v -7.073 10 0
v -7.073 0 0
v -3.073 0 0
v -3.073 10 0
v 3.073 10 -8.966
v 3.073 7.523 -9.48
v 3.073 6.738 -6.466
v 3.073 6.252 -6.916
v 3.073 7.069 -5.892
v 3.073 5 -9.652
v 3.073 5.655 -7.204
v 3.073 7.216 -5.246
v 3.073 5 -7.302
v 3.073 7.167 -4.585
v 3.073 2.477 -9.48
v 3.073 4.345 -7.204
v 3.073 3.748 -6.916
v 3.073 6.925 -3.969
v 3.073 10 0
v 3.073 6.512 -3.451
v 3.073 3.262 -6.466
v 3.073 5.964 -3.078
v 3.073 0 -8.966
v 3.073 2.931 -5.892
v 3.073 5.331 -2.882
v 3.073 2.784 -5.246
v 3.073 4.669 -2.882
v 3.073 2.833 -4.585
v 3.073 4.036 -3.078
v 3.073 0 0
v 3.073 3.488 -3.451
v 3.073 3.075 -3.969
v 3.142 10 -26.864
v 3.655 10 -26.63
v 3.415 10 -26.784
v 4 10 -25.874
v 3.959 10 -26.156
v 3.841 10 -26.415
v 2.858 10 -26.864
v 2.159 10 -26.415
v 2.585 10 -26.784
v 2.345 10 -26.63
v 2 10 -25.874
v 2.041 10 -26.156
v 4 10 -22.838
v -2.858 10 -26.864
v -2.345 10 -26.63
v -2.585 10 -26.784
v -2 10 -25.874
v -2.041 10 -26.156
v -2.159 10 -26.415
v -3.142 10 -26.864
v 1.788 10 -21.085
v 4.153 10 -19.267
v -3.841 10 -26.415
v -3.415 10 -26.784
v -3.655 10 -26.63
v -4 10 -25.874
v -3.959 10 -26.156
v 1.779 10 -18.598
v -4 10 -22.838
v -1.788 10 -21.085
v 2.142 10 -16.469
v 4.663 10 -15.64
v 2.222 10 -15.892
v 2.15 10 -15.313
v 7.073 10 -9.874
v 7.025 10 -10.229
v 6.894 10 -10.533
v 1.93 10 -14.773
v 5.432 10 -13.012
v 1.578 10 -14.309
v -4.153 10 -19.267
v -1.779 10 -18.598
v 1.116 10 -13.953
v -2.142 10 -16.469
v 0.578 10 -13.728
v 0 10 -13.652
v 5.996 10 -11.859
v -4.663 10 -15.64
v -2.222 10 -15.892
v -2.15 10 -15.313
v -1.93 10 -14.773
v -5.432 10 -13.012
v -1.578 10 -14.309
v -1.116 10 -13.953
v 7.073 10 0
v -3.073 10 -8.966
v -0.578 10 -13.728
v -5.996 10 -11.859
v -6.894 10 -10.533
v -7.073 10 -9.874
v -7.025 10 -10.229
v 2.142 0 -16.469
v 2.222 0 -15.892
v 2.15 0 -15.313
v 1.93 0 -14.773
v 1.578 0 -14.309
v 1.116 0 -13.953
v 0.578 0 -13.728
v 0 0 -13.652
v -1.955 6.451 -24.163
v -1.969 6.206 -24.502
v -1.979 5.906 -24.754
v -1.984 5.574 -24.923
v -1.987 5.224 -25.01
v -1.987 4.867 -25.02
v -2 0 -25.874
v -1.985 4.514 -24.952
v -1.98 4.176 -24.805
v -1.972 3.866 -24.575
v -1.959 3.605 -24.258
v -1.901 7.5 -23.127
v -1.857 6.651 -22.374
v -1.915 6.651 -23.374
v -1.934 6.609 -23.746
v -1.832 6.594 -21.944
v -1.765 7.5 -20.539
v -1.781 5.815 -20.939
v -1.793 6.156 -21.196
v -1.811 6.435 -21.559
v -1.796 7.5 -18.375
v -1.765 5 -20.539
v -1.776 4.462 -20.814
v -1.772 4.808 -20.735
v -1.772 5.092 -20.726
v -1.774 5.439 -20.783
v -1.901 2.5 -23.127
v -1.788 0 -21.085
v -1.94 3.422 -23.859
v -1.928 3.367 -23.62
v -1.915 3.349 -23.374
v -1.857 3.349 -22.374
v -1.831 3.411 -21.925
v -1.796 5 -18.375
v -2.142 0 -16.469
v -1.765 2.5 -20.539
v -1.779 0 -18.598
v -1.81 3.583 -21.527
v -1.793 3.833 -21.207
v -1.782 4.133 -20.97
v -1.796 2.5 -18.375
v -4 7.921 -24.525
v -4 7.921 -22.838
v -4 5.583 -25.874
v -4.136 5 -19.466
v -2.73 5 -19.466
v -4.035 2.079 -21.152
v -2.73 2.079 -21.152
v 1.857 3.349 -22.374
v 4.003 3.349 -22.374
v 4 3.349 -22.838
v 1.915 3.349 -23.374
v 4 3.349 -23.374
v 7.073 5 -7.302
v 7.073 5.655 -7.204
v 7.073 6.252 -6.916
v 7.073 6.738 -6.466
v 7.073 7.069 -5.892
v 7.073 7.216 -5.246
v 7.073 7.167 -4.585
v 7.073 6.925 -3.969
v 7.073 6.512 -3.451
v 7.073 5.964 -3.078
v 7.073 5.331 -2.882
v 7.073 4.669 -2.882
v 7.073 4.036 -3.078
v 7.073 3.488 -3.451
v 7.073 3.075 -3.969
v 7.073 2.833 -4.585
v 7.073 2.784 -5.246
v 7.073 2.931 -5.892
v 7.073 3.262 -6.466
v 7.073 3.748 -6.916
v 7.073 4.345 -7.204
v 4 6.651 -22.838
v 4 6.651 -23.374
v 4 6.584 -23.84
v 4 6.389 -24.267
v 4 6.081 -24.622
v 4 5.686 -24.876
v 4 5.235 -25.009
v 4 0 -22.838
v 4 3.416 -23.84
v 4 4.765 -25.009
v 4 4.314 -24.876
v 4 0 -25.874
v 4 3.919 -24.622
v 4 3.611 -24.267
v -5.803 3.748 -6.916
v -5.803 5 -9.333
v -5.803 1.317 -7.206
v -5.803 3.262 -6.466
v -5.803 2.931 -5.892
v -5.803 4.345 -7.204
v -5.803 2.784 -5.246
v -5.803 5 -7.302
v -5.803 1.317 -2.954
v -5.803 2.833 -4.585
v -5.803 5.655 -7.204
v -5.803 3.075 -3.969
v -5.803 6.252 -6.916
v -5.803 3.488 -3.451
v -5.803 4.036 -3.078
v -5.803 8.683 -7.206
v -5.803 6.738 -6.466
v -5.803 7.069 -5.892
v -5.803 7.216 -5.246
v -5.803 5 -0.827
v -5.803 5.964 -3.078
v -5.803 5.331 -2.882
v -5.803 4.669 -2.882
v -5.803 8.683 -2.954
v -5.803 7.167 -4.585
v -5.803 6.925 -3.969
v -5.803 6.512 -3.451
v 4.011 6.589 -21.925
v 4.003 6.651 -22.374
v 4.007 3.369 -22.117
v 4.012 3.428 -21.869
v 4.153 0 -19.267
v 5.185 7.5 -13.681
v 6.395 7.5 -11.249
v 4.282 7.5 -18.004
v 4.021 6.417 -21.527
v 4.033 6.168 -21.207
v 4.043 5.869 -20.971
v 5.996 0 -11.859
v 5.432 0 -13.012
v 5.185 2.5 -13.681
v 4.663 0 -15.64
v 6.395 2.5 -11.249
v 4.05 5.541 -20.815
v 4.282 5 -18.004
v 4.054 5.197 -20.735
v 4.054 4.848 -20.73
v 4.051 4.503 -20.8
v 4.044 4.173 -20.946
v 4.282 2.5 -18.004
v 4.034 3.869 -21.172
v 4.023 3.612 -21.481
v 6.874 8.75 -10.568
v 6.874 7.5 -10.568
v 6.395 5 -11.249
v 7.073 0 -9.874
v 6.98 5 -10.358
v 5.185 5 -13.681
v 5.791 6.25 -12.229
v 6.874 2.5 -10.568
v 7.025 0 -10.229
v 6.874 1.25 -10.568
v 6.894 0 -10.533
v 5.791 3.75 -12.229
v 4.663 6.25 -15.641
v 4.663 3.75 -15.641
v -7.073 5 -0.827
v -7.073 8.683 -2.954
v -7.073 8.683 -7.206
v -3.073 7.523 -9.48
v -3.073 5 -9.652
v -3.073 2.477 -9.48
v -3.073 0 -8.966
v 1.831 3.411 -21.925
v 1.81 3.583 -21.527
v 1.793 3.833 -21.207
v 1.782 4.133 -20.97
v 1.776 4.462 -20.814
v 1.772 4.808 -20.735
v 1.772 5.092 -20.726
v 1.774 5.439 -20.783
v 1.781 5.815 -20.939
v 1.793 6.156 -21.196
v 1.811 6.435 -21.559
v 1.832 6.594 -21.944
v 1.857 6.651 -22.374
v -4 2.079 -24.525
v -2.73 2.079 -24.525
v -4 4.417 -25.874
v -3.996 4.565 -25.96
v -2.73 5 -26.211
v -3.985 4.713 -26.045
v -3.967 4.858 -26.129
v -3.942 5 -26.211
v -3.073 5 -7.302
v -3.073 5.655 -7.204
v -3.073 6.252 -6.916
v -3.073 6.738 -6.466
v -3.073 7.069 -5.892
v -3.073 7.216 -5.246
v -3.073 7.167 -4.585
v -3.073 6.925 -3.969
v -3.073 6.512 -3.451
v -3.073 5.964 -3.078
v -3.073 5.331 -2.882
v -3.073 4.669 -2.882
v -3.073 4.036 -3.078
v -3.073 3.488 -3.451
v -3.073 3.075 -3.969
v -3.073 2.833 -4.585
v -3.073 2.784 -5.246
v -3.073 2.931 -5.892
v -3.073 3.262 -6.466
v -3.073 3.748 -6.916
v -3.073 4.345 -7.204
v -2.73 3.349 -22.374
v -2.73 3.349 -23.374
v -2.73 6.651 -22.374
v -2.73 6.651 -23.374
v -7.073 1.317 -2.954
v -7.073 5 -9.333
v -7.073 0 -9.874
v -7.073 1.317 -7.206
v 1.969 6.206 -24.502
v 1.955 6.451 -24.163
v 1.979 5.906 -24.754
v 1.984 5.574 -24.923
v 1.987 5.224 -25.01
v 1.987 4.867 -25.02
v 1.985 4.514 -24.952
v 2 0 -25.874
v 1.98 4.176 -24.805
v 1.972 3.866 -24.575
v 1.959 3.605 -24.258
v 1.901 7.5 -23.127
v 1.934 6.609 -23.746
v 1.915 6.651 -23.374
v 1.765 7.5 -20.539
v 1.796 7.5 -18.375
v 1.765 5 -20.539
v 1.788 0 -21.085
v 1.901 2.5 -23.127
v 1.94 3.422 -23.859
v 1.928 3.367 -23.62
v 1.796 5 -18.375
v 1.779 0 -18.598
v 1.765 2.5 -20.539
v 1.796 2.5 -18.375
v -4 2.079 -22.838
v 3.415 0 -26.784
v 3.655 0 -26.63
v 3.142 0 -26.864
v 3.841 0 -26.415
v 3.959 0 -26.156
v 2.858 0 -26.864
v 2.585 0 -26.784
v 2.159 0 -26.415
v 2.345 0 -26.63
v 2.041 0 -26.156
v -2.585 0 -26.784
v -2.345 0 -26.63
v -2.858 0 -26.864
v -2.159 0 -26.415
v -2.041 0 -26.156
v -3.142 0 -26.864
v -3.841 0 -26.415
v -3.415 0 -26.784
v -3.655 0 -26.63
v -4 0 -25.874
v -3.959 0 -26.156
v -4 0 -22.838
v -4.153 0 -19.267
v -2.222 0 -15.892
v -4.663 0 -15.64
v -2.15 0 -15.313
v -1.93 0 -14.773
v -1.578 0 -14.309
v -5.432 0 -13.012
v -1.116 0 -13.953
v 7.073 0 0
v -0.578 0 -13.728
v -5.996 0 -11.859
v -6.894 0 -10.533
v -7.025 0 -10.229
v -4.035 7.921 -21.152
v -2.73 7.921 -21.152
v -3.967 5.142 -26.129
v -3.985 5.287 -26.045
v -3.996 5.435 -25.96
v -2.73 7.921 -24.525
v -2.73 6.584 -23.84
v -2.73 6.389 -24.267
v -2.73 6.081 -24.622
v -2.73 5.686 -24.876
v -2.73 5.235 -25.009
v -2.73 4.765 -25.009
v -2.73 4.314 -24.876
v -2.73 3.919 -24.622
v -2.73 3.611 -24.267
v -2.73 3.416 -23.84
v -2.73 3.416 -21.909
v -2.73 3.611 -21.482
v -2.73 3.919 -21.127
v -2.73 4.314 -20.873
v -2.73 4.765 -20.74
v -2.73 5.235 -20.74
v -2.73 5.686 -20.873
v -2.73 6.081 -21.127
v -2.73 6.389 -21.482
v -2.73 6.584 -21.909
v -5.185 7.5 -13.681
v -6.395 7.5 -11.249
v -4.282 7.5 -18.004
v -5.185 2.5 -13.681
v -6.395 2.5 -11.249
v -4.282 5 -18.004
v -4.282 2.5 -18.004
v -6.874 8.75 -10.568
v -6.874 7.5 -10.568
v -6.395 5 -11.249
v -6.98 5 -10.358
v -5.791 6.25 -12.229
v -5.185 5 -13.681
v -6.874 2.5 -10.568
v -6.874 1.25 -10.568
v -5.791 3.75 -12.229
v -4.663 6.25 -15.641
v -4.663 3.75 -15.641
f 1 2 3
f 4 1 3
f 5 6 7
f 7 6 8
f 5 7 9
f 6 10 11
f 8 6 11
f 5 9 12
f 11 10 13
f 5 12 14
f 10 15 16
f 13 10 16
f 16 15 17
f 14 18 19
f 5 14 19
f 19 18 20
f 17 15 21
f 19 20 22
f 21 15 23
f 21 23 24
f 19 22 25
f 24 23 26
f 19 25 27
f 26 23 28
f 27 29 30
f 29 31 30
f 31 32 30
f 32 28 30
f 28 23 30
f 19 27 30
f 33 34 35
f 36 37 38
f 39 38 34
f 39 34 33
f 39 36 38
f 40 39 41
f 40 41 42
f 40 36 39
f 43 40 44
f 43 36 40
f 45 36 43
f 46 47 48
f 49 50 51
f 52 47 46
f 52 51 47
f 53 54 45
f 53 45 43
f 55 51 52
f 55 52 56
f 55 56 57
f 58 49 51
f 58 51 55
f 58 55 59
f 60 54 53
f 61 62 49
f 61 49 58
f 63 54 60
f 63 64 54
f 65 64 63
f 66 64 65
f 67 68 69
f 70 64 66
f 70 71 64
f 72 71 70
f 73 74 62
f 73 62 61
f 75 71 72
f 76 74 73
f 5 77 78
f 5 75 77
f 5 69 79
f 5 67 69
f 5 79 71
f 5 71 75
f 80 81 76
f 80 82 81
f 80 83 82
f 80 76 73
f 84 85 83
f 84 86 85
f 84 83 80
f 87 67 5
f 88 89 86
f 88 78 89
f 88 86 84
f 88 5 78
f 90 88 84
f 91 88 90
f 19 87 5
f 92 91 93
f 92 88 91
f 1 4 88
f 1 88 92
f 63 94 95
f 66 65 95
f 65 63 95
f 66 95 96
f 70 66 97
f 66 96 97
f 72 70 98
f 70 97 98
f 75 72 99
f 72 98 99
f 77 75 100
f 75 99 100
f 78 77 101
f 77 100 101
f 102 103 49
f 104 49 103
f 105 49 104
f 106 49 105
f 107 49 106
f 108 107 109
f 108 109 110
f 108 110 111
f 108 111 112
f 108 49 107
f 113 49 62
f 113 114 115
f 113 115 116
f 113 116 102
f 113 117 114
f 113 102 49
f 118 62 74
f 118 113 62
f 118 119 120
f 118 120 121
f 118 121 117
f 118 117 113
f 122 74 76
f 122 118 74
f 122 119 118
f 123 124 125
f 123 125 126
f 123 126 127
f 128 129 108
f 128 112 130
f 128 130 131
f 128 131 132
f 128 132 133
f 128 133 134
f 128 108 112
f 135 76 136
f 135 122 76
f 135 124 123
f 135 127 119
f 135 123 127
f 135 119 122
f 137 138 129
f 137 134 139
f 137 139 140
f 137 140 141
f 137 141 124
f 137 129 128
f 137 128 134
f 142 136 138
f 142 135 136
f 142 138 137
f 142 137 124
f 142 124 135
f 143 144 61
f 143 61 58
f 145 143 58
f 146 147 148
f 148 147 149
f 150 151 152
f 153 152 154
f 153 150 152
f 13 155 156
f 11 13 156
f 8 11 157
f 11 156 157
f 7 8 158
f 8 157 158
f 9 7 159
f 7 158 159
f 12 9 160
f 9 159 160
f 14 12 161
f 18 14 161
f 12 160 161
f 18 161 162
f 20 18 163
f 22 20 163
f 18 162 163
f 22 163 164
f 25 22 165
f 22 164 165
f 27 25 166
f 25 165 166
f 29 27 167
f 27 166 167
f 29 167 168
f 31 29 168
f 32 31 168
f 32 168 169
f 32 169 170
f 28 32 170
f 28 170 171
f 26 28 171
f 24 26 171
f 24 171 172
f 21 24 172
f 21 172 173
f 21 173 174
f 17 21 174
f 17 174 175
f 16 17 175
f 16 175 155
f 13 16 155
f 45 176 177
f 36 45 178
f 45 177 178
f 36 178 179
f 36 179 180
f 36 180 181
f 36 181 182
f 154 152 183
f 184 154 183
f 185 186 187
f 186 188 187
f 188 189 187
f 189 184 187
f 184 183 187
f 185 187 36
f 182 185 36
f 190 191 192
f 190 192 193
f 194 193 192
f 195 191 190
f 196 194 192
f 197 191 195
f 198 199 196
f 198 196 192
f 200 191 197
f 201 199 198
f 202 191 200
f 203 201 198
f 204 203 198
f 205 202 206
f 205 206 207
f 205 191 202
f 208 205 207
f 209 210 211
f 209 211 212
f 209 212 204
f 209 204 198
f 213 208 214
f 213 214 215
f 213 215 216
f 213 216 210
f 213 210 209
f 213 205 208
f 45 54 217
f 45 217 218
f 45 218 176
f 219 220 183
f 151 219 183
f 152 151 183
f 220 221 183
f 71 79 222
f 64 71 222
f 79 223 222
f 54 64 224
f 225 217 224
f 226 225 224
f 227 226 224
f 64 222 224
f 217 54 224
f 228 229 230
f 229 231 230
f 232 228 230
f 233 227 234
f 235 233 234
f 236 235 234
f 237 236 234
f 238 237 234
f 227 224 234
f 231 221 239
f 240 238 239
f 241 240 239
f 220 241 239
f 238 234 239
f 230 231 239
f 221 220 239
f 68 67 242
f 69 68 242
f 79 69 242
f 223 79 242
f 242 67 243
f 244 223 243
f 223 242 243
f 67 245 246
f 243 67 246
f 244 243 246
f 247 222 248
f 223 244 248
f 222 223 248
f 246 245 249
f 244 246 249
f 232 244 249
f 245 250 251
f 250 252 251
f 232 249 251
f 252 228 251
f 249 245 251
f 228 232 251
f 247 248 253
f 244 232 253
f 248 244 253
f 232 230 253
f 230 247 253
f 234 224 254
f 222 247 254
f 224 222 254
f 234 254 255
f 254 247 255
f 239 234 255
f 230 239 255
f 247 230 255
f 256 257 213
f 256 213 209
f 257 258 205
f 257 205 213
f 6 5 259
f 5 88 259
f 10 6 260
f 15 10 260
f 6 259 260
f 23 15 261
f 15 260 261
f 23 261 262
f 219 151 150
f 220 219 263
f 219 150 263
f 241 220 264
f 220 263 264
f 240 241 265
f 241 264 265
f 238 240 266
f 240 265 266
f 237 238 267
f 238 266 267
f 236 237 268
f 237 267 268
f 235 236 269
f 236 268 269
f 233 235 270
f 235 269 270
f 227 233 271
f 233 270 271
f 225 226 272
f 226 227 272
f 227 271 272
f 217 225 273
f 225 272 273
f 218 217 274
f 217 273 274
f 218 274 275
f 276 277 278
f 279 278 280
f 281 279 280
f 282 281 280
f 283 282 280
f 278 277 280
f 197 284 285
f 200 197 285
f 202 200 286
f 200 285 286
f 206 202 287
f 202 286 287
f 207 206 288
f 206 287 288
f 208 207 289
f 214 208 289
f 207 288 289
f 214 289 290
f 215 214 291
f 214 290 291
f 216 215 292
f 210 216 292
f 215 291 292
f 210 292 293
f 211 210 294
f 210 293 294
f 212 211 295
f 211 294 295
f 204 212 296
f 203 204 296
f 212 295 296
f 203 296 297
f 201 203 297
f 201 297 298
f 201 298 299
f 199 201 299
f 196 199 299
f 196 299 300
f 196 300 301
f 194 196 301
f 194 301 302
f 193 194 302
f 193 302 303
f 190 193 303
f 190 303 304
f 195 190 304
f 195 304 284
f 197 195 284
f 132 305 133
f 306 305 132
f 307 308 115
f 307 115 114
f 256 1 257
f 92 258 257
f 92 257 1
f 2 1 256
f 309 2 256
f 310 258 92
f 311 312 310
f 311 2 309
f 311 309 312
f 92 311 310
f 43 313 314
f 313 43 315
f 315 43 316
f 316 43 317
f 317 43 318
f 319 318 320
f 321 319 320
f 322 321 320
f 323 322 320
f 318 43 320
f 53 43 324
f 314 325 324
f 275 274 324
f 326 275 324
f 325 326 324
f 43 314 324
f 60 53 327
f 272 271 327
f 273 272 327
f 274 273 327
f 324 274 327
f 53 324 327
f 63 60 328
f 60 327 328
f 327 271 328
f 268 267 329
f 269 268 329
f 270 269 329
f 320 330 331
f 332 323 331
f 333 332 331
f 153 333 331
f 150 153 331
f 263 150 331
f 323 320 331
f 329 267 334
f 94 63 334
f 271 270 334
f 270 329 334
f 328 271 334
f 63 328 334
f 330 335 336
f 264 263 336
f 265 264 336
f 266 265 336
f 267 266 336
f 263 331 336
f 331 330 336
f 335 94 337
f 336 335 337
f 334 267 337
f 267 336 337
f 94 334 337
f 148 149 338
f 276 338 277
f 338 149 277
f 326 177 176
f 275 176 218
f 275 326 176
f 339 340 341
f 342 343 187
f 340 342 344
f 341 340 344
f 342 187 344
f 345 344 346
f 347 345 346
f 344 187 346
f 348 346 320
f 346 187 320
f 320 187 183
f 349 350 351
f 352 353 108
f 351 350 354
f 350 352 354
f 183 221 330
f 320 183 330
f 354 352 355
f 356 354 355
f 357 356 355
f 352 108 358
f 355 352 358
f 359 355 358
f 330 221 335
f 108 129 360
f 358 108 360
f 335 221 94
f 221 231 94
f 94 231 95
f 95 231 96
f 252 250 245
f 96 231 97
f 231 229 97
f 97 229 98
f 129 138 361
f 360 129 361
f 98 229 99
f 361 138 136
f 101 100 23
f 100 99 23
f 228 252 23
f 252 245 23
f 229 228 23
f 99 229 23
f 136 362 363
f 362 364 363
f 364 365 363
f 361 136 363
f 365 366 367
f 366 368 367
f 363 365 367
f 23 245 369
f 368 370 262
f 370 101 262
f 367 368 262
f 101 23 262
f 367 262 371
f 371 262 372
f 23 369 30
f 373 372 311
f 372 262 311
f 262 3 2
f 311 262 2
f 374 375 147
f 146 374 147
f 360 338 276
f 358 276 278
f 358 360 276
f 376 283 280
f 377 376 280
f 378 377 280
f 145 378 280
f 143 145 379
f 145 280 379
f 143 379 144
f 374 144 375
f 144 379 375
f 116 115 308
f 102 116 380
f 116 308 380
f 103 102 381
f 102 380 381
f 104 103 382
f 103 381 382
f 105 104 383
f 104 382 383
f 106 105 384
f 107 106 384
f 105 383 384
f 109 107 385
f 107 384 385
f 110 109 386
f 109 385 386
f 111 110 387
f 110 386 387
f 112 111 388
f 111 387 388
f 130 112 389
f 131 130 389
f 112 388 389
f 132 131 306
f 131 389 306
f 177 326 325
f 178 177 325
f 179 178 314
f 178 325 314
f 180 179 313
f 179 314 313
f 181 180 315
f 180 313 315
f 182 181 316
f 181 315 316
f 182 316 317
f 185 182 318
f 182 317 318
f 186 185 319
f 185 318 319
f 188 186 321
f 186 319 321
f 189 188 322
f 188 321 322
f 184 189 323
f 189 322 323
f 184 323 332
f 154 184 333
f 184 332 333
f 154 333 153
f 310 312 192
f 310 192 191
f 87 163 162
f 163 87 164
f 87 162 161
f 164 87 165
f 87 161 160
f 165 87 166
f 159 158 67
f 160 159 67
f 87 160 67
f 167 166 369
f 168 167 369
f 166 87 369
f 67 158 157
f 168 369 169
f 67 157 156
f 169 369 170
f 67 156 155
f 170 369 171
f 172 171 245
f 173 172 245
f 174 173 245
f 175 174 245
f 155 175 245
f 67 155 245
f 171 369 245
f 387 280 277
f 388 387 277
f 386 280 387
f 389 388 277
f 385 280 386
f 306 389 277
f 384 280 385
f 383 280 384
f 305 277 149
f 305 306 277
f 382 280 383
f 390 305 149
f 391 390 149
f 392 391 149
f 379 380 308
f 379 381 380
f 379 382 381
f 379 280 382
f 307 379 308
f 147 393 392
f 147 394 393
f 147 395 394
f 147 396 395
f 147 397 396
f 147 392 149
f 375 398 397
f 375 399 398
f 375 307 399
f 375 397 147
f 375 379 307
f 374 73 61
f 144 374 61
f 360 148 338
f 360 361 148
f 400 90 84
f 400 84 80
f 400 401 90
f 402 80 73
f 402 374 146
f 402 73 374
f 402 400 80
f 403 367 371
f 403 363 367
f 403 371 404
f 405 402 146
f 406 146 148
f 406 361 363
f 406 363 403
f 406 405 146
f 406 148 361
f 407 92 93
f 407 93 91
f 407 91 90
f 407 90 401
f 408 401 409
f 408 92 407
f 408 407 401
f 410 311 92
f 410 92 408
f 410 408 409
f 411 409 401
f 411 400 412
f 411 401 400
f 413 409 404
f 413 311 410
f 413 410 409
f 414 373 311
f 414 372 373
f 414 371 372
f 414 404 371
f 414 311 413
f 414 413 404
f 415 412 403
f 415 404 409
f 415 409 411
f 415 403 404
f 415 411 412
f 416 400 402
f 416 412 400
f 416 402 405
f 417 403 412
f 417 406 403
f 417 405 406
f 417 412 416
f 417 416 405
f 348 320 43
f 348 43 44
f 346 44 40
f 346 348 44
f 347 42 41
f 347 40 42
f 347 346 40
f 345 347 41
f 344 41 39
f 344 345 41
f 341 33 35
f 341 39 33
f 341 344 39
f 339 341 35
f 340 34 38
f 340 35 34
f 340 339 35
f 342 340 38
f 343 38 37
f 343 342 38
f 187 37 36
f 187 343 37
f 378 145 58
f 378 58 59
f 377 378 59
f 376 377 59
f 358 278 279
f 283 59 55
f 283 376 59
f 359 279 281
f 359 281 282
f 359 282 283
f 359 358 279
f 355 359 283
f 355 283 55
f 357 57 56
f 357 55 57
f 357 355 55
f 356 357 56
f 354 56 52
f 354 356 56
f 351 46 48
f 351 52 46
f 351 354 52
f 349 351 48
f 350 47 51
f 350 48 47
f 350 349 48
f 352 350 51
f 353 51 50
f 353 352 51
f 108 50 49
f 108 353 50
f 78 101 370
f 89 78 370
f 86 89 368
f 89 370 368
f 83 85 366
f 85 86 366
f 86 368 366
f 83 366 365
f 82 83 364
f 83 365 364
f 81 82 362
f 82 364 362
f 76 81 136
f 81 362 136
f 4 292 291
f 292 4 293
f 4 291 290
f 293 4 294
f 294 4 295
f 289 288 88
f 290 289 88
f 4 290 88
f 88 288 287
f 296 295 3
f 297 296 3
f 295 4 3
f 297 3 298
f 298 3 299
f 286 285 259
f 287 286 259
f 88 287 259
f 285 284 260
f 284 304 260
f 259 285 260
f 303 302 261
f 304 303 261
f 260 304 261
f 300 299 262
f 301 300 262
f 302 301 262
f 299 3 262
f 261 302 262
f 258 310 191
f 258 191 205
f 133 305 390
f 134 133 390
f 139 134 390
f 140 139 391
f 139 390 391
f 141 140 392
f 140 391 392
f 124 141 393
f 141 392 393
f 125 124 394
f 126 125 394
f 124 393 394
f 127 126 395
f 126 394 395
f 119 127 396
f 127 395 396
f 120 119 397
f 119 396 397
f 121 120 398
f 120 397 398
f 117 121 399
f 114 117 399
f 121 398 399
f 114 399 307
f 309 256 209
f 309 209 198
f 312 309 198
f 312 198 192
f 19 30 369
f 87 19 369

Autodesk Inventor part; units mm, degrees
ref_plane "YZ Plane" through (0, 0, 0) normal (1, 0, 0) x (0, 1, 0)
ref_plane "XZ Plane" through (0, 0, 0) normal (0, 1, 0) x (-1, 0, 0)
ref_plane "XY Plane" through (0, 0, 0) normal (0, 0, 1) x (1, 0, 0)
sketch "Sketch1" plane through (0, 0, 0) normal (0, 1, 0) x (-1, 0, 0)
  arc A0 (2.1415, -16.469) -> (0, -13.652) centre (0, -15.8745) ccw
  line L0 (7.0734, 0) -> (7.0734, -9.8745)
  line L1 (0, 0.4443) -> (0, -21.7427) construction
  line L2 (-7.0734, 0) -> (-7.0734, -9.8745)
  arc A1 (0, -13.652) -> (-2.1415, -16.469) centre (0, -15.8745) ccw
  line L3 (4, -22.8384) -> (4, -25.8745)
  line L4 (-4, -22.8384) -> (-4, -25.8745)
  arc A2 (2, -25.8745) -> (4, -25.8745) centre (3, -25.8745) ccw
  arc A3 (-4, -25.8745) -> (-2, -25.8745) centre (-3, -25.8745) ccw
  line L5 (3.0734, 0) -> (3.0734, -9.652)
  line L6 (3.0734, -9.652) -> (-3.0734, -9.652)
  line L7 (-3.0734, -9.652) -> (-3.0734, 0)
  line L8 (7.0734, 0) -> (3.0734, 0)
  line L9 (-3.0734, 0) -> (-7.0734, 0)
  spline S0 degree 4 poles (2, -25.8745) (2, -23.2445) (1.6155, -19.943) (1.6024, -18.411) (2.1415, -16.469) knots 0 0 0 0 0 1 1 1 1 1
  spline S1 degree 4 poles (-2, -25.8745) (-2, -23.2445) (-1.6155, -19.943) (-1.6024, -18.411) (-2.1415, -16.469) knots 0 0 0 0 0 1 1 1 1 1
  spline S2 degree 4 poles (7.0734, -9.8745) (7.0734, -11.5508) (4.5976, -10.8217) (4, -18.7622) (4, -22.8384) knots 0 0 0 0 0 1 1 1 1 1
  spline S3 degree 4 poles (-7.0734, -9.8745) (-7.0734, -11.5508) (-4.5976, -10.8217) (-4, -18.7622) (-4, -22.8384) knots 0 0 0 0 0 1 1 1 1 1
  point P0 (0, 0)
  point P1 (0, -9.652)
  point P2 (1.75, -19.9116)
  point P3 (-1.75, -19.9116)
  point P4 (6.2466, -11.4624)
  point P5 (-6.2466, -11.4624)
  dimension "d6" = 6
  dimension "d7" = 1
  dimension "d8" = 2.2225
  dimension "d19" = 9.652
  dimension "d20" = 6.1468
  dimension "d27" = 4
  dimension "d31" = 4
  dimension "d34" = 3.5
  dimension "d35" = 10
  dimension "d37" = 4
extrude "Extrusion1" add sketch "Sketch1" along normal blind 10
sketch "Sketch2" plane through (7.0734, 0, 0) normal (1, 0, 0) x (0, 0, -1)
  circle A0 centre (5.08, 5) radius 2.2225
  line L0 (0, 10) -> (9.8745, 10) projected
  line L1 (0, 0) -> (0, 10) projected
  point P0 (9.652, 10)
  dimension "d14" = 4.445
  dimension "d15" = 5
  dimension "d32" = 4.572
extrude "Extrusion2" cut sketch "Sketch2" against normal blind 15
sketch "Sketch3" plane through (4, 0, -22.8384) normal (1, 0, 0) x (0, 0, -1)
  circle A0 centre (-17.7584, 5) radius 2.2225 projected
  line L0 (3.0361, 0) -> (3.0361, 10) projected
  line L1 (0.0361, 5) -> (1.518, 10) construction
  line L2 (3.0361, 10) -> (0, 10) construction
  line L3 (0.5361, 5) -> (-0.4639, 5) construction
  line L4 (0.5361, 6.651) -> (-0.4639, 6.651)
  line L5 (-0.4639, 3.349) -> (0.5361, 3.349)
  arc A1 (0.5361, 3.349) -> (0.5361, 6.651) centre (0.5361, 5) ccw
  arc A2 (-0.4639, 6.651) -> (-0.4639, 3.349) centre (-0.4639, 5) ccw
  point P0 (-22.8384, 0)
  dimension "d21" = 3
  dimension "d24" = 1
  dimension "d30" = 1.651
extrude "Extrusion3" cut sketch "Sketch3" along normal mid plane 20 contours A1 L5 A2 L4
sketch "Sketch4" plane through (-7.0734, 0, -9.8745) normal (-1, 0, 0) x (0, 0, 1)
  line L0 (0, 0) -> (9.8745, 0) projected
  line L1 (9.8745, 0) -> (9.8745, 10) projected
  line L2 (0, 10) -> (9.8745, 10) projected
  line L3 (0, 0) -> (0, 10) projected
  circle A0 centre (4.7945, 5) radius 2.2225 projected
  line L4 (6.9209, 8.683) -> (9.0473, 5)
  line L5 (9.0473, 5) -> (6.9209, 1.317)
  line L6 (6.9209, 1.317) -> (2.6681, 1.317)
  line L7 (2.6681, 1.317) -> (0.5417, 5)
  line L8 (0.5417, 5) -> (2.6681, 8.683)
  line L9 (2.6681, 8.683) -> (6.9209, 8.683)
  dimension "d25" = 7.366
extrude "Extrusion4" cut sketch "Sketch4" against normal blind 1.27 contours A0 | L4 L5 L6 L7 L8 L9
sketch "Sketch5" plane through (-4, 0, -25.8745) normal (-1, 0, 0) x (0, 0, 1)
  line L0 (1.3496, 7.921) -> (4.7225, 7.921)
  line L1 (4.7225, 7.921) -> (6.4089, 5)
  line L2 (6.4089, 5) -> (4.7225, 2.079)
  line L3 (4.7225, 2.079) -> (1.3496, 2.079)
  line L4 (1.3496, 2.079) -> (-0.3368, 5)
  line L5 (-0.3368, 5) -> (1.3496, 7.921)
  arc A0 (2.5, 6.651) -> (2.5, 3.349) centre (2.5, 5) ccw projected
  point P0 (25.8745, 0)
  point P1 (3.0361, 5)
  point P2 (3.5, 6.651)
  point P3 (3.5, 3.349)
  point P4 (3.0361, 6.651)
  point P5 (3.0361, 3.349)
  dimension "d38" = 5.842
extrude "Extrusion5" cut sketch "Sketch5" along normal mid plane 2.54
sketch "Sketch6" plane through (-3.0734, 0, 0) normal (1, 0, 0) x (0, 0, -1)
  line L0 (9.652, 0) -> (0, 0) projected
  line L1 (9.652, 10) -> (0, 10) projected
  arc A0 (8.9662, 0) -> (8.9662, 10) centre (-8.9178, 5) ccw
  line L2 (0, 10) -> (9.8745, 10) projected
  line L3 (9.8745, 0) -> (9.8745, 10) projected
  line L4 (0, 0) -> (9.8745, 0) projected
  line L5 (9.652, 0) -> (9.652, 10) projected
  point P0 (9.652, 5)
  point P1 (9.652, 4.8706)
  dimension "d41" = 0.6858
  dimension "d44" = 0.6858
extrude "Extrusion6" add sketch "Sketch6" along normal blind 10
equation "\"TUBE\" = 4.445"
equation "\"SCREW\" = 3.302"
equation "\"HEX\" = 5.842"
equation "\"HEX_DEPTH\" = 1.27"
properties part number "SlideClip"
